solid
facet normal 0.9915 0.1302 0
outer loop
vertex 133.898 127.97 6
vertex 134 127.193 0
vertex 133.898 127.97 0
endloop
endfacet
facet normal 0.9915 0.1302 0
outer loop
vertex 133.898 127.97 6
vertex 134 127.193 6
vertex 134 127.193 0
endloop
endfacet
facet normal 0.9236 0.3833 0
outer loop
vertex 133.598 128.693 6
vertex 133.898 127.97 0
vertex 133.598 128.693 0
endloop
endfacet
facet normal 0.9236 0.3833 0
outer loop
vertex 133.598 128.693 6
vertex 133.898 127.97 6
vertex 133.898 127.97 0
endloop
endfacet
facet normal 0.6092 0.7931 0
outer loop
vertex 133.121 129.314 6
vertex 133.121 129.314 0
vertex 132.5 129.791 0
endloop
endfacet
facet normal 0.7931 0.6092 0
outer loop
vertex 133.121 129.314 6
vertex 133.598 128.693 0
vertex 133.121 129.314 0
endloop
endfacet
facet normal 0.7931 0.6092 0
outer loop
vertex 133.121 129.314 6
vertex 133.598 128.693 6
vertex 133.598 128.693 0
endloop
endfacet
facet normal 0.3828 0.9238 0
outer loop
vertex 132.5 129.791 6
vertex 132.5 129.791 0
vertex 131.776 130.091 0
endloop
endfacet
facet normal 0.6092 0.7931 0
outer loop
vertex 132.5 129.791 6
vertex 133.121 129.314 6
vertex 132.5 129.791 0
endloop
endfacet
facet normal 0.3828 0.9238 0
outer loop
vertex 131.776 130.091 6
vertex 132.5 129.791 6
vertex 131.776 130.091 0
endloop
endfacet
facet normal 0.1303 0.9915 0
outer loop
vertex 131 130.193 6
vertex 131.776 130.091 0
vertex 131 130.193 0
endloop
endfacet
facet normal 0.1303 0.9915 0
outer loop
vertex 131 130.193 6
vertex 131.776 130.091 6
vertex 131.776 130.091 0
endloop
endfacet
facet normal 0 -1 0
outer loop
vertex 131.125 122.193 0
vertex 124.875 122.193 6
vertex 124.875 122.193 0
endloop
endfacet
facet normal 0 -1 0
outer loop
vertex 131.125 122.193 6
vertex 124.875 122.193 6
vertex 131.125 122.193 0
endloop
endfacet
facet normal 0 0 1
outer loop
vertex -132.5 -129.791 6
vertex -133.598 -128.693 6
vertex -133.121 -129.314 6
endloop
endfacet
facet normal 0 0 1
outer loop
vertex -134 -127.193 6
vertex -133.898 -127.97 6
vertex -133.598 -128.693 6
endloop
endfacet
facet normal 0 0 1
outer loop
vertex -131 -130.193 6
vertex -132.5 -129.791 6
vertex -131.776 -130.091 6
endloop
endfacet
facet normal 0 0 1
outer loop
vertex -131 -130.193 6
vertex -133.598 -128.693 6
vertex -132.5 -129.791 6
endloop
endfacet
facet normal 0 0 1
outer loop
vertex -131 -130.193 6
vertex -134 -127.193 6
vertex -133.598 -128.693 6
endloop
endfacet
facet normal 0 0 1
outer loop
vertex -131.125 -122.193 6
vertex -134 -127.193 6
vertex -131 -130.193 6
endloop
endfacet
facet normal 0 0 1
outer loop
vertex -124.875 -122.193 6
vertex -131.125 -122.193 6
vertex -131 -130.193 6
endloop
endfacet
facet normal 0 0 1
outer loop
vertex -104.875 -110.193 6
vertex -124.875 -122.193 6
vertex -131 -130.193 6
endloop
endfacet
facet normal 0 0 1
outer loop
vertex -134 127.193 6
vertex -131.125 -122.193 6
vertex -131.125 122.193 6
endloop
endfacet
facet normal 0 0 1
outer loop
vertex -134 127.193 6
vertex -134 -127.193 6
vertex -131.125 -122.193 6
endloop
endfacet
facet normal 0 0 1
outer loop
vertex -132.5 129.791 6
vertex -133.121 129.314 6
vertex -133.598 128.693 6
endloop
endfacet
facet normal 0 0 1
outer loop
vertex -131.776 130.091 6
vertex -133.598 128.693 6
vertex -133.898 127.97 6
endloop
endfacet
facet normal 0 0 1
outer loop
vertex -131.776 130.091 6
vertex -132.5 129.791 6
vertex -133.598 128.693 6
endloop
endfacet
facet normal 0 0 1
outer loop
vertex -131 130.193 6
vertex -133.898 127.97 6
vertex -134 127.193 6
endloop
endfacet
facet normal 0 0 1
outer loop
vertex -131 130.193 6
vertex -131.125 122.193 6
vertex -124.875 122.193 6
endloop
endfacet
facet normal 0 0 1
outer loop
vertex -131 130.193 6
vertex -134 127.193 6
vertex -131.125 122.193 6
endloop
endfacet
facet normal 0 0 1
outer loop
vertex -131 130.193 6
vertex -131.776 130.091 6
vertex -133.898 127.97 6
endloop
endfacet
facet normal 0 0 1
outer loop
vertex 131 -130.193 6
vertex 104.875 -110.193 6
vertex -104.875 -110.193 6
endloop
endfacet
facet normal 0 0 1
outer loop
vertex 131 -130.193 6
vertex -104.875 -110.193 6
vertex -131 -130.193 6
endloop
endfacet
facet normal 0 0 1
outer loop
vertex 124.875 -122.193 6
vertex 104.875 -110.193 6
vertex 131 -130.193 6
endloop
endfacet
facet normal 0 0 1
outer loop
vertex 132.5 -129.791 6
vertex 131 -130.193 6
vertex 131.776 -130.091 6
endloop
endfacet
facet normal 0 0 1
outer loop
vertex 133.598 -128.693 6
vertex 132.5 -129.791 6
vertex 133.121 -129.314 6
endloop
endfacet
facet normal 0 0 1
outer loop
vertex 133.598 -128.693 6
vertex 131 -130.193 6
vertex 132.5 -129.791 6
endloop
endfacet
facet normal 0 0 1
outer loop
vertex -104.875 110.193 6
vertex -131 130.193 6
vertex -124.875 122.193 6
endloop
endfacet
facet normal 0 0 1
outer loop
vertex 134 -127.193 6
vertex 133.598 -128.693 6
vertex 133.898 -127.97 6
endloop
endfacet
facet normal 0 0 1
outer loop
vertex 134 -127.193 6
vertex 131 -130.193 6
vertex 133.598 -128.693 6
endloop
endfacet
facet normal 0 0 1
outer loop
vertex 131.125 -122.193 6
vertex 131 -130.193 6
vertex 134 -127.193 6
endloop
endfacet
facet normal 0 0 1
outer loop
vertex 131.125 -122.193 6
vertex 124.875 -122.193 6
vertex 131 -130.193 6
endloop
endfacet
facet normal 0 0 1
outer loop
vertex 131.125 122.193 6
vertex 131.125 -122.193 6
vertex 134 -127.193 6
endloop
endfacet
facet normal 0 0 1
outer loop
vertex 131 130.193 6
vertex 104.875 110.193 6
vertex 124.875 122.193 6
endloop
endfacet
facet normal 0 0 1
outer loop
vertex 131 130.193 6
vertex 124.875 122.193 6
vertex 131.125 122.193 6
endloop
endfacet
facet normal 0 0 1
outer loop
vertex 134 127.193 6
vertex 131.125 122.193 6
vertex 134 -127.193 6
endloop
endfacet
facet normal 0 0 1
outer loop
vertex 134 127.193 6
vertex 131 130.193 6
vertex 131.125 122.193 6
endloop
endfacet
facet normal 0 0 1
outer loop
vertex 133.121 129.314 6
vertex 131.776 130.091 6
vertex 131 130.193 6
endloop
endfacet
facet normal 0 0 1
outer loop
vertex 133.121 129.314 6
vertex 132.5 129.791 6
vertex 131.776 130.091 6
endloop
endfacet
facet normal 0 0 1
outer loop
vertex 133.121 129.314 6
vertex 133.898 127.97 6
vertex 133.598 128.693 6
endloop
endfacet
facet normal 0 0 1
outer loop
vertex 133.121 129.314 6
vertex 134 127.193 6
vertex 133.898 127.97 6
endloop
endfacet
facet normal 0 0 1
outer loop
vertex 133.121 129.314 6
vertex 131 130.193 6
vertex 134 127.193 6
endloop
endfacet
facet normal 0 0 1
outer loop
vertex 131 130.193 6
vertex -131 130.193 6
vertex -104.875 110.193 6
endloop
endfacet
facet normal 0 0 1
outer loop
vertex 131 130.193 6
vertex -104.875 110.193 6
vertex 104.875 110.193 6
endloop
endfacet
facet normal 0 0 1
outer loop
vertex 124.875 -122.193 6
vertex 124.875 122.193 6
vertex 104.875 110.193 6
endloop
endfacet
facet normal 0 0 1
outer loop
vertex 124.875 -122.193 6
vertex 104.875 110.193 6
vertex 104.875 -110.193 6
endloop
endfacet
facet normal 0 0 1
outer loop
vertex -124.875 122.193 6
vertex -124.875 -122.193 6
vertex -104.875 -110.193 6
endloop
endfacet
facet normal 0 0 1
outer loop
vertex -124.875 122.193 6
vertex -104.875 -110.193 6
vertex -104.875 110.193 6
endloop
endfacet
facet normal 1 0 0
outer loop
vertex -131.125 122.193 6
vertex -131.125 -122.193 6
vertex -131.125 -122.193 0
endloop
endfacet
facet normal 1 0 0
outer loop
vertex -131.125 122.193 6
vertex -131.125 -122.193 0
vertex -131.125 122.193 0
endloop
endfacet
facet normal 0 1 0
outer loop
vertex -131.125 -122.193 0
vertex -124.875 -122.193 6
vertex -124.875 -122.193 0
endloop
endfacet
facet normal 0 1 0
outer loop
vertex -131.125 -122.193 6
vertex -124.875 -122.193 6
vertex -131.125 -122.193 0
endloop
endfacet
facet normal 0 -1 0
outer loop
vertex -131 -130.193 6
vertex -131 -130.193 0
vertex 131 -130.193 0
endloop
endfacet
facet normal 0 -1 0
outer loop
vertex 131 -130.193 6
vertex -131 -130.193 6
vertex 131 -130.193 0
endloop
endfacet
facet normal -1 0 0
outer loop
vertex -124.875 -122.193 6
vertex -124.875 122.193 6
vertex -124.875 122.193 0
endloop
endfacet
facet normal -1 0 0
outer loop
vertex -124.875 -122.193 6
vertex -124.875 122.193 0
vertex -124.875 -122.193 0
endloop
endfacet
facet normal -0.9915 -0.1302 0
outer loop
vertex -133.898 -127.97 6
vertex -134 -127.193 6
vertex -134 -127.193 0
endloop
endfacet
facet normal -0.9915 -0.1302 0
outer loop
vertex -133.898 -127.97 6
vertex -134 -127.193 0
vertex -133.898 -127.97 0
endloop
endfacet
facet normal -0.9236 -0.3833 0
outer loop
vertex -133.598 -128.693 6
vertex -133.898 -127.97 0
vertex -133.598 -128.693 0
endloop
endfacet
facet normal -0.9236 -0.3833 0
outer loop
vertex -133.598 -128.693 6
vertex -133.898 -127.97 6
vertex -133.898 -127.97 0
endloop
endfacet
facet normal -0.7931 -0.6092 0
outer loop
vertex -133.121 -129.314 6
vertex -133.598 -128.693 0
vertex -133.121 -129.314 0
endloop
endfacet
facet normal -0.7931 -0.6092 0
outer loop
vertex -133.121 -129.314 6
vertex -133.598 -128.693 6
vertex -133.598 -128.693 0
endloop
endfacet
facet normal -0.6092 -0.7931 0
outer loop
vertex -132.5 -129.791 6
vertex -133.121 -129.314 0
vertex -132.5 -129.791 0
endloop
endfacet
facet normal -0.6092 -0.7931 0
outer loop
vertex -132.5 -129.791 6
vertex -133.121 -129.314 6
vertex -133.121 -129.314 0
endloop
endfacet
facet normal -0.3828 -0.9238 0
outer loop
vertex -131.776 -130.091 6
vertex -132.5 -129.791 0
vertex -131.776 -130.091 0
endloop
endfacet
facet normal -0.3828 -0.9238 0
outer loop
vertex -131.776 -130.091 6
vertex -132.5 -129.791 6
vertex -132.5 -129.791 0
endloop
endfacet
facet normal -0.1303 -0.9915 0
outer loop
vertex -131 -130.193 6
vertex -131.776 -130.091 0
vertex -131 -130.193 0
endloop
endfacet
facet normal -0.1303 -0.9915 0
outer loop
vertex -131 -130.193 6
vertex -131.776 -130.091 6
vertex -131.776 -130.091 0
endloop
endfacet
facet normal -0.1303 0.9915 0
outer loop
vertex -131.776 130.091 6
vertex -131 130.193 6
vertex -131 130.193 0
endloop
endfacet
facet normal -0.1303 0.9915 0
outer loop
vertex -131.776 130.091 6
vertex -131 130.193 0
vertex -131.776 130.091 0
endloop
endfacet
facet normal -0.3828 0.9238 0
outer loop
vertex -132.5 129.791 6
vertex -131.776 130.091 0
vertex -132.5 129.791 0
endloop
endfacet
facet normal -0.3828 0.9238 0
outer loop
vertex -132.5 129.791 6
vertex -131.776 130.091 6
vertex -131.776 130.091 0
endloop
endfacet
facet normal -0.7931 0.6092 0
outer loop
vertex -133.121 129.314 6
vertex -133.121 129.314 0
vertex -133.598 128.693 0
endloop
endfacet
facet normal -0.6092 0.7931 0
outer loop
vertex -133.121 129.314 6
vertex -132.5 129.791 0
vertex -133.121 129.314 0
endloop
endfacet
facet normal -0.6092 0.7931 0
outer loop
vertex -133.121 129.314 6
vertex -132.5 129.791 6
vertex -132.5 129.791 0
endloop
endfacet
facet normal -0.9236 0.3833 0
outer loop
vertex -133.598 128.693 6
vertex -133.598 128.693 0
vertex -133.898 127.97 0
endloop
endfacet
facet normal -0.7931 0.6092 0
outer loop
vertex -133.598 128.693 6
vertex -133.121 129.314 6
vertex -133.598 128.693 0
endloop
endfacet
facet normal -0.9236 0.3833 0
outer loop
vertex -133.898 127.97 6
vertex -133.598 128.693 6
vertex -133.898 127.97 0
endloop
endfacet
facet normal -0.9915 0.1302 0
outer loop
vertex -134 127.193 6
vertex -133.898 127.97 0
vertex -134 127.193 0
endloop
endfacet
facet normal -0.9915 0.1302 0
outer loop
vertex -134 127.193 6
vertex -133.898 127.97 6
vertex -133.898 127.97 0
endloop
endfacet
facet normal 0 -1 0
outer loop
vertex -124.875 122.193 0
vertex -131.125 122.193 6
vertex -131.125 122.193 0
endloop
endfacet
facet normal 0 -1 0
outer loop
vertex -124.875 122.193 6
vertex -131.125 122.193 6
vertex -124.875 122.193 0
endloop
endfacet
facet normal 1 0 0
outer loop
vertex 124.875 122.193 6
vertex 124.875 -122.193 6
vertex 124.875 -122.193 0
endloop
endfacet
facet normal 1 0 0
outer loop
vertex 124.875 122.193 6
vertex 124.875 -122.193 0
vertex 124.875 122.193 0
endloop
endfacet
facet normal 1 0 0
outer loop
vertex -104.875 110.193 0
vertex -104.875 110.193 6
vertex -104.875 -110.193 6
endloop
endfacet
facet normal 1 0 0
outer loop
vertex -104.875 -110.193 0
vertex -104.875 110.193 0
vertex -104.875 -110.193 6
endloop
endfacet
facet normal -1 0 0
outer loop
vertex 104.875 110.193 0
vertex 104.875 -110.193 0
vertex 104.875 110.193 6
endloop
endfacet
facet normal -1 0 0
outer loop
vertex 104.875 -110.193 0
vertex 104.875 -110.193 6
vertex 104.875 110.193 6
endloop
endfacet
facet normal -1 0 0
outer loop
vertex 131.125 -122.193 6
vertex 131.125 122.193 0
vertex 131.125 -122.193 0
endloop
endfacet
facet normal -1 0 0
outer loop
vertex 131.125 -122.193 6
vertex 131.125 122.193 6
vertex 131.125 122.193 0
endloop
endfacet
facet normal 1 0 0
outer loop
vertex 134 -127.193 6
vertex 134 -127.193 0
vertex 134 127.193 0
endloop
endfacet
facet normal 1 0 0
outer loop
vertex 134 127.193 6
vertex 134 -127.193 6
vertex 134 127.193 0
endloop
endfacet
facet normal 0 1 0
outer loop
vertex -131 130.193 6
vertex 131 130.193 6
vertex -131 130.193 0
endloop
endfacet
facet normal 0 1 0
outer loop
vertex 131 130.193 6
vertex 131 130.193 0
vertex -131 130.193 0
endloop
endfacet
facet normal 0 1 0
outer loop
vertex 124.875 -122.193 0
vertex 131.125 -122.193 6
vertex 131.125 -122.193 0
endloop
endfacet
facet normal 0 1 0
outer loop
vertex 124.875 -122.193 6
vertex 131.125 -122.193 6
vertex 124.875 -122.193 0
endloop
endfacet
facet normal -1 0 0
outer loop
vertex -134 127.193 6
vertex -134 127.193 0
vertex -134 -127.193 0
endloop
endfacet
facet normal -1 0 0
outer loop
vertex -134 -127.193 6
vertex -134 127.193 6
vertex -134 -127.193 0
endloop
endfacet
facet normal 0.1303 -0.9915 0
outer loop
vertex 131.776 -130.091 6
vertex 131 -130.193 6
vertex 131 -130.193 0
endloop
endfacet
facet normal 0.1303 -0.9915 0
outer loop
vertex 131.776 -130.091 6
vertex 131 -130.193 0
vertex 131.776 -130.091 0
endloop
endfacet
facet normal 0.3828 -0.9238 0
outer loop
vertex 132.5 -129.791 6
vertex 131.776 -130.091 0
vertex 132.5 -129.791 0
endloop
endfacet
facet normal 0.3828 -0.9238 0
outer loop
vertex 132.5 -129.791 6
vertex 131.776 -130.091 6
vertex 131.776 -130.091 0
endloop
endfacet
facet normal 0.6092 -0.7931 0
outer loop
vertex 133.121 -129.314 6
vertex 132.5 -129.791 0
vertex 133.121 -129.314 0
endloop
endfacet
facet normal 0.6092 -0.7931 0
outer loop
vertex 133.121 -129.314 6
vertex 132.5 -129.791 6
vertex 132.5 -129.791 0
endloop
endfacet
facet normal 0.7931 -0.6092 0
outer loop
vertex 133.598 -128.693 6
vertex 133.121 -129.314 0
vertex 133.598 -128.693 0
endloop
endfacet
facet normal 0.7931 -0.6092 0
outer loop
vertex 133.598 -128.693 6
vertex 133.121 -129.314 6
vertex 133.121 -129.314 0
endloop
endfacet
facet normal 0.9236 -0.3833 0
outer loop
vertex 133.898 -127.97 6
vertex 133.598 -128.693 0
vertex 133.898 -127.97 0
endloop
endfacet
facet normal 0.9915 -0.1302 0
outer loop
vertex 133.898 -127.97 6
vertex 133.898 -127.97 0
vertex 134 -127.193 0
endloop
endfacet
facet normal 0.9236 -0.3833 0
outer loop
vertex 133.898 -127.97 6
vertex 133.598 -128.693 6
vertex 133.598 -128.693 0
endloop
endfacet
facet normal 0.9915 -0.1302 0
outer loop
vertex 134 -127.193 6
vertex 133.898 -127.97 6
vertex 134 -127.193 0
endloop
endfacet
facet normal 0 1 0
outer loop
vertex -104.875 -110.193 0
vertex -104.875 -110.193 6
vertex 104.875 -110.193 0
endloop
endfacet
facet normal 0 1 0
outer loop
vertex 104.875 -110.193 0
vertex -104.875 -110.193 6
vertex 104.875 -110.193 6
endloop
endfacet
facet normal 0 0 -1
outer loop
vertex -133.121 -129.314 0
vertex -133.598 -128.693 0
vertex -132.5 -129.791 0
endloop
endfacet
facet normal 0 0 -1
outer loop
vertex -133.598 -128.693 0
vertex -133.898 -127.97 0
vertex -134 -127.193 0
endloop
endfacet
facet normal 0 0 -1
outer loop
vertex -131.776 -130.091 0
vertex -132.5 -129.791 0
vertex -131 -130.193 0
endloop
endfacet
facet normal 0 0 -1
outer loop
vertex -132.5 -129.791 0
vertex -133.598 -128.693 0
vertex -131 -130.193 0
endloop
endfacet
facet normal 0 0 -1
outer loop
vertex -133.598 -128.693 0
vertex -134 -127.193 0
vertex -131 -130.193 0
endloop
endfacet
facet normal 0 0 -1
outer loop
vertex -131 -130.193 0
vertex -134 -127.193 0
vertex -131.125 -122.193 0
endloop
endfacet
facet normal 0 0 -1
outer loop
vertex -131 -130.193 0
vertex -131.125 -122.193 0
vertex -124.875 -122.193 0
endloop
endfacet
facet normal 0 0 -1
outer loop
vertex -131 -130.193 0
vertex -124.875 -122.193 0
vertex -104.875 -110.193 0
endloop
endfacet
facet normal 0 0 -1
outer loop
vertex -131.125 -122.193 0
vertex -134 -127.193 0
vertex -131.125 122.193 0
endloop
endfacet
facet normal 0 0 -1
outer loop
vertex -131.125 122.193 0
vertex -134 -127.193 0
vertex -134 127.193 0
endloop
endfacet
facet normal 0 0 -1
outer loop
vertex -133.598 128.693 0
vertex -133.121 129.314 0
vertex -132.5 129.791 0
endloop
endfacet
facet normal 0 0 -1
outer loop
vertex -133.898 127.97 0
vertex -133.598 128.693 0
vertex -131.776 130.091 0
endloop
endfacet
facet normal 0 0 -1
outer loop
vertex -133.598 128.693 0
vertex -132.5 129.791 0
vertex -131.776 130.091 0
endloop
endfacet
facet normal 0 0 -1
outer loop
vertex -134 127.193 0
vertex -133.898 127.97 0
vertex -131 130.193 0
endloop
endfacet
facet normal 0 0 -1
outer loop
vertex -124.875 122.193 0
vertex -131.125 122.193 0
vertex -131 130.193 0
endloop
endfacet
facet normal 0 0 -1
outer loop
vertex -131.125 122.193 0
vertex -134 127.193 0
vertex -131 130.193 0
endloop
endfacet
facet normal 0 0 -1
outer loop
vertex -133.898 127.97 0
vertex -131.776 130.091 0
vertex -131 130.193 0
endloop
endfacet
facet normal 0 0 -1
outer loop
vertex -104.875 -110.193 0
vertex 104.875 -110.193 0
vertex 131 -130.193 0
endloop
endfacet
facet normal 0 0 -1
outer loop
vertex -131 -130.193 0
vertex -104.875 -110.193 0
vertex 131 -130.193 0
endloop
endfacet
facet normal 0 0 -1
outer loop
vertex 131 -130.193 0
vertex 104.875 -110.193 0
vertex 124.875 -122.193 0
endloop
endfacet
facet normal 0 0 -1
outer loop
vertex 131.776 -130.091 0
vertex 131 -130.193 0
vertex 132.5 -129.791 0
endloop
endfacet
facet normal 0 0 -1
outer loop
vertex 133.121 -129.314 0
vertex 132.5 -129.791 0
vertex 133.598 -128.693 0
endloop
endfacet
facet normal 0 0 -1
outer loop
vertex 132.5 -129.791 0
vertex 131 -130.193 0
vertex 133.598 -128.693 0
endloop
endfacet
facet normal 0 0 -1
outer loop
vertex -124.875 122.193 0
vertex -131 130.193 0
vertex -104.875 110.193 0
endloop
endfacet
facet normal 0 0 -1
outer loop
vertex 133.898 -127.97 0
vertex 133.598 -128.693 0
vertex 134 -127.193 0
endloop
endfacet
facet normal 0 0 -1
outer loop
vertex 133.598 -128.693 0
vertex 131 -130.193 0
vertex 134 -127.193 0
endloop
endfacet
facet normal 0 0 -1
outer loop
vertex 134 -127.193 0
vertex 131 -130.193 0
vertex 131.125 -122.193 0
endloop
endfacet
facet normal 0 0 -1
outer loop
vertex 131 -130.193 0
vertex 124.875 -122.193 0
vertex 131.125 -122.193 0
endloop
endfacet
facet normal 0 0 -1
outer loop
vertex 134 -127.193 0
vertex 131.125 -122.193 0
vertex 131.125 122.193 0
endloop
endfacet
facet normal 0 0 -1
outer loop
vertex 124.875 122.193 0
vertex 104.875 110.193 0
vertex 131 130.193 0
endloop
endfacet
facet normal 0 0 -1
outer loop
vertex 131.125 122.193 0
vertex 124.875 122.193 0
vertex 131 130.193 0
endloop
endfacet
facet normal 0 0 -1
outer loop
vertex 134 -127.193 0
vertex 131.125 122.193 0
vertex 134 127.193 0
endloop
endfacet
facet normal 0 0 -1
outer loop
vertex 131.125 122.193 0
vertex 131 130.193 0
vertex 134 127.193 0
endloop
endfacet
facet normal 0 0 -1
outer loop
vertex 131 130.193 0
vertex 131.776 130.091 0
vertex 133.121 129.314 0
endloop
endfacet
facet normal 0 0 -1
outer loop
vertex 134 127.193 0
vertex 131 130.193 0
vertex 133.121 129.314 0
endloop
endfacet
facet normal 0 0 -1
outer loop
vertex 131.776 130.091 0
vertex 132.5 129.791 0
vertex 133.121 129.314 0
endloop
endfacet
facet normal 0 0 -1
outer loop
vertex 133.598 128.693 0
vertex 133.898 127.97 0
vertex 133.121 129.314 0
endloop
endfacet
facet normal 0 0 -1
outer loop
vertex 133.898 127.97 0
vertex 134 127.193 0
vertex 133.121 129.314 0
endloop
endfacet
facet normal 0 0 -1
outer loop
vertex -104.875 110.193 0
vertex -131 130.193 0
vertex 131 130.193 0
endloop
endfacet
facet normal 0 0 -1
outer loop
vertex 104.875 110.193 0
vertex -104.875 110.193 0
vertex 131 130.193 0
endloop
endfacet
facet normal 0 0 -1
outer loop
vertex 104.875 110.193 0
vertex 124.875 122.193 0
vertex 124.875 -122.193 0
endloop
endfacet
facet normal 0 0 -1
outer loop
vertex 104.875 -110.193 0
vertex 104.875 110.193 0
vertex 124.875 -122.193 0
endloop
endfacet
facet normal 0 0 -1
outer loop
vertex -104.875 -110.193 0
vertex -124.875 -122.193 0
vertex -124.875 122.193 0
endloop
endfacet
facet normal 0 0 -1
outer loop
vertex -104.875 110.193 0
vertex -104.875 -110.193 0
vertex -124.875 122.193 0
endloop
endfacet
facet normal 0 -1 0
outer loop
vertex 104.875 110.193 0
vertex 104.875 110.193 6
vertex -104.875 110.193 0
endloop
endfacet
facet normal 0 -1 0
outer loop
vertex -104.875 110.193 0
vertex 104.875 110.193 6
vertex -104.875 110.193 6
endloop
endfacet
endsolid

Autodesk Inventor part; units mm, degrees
ref_plane "YZ Plane" through (0, 0, 0) normal (1, 0, 0) x (0, 1, 0)
ref_plane "XZ Plane" through (0, 0, 0) normal (0, 1, 0) x (-1, 0, 0)
ref_plane "XY Plane" through (0, 0, 0) normal (0, 0, 1) x (1, 0, 0)
sketch "Sketch1" plane through (0, 0, 0) normal (0, 0, 1) x (1, 0, 0)
  line L0 (-134, -130.1931) -> (134, -130.1931)
  line L1 (134, -130.1931) -> (134, 130.1931)
  line L2 (134, 130.1931) -> (-134, 130.1931)
  line L3 (-134, 130.1931) -> (-134, -130.1931)
  line L4 (-134, -130.1931) -> (134, 130.1931) construction
  line L5 (134, -130.1931) -> (-134, 130.1931) construction
  point P0 (0, 0)
  dimension "d0" = 268
  dimension "d1" = 260.3863
extrude "Extrusion1" add sketch "Sketch1" along normal blind 6
sketch "Sketch2" plane through (0, 0, 6) normal (0, 0, 1) x (1, 0, 0)
  line L0 (-134, -130.1931) -> (134, -130.1931) projected
  line L1 (134, 130.1931) -> (-134, 130.1931) projected
  line L2 (-134, 130.1931) -> (-134, -130.1931) projected
  line L3 (-131.125, 122.1931) -> (-124.875, 122.1931)
  line L4 (-124.875, 122.1931) -> (-124.875, -122.1931)
  line L5 (-124.875, -122.1931) -> (-131.125, -122.1931)
  line L6 (-131.125, -122.1931) -> (-131.125, 122.1931)
  line L7 (-131.125, 122.1931) -> (-124.875, -122.1931) construction
  line L8 (-124.875, 122.1931) -> (-131.125, -122.1931) construction
  point P0 (0, 0)
  point P1 (-128, 0)
  dimension "d5" = 2.875
  dimension "d6" = 6.25
  dimension "d7" = 8
  dimension "d101" = 8
extrude "Extrusion2" cut sketch "Sketch2" against normal through all
mirror "Mirror1" about plane through (0, 0, 0) normal (1, 0, 0) of "Extrusion2"
fillet "Fillet1" radius 3 4 edges at (134, 130.1931, 3) (134, -130.1931, 3) (-134, 130.1931, 3) (-134, -130.1931, 3)
sketch "Sketch3" plane through (0, 0, 6) normal (0, 0, 1) x (1, 0, 0)
  line L0 (131, 130.1931) -> (-131, 130.1931) projected
  line L1 (-124.875, 122.1931) -> (-124.875, -122.1931) projected
  line L2 (-104.875, -110.1931) -> (104.875, -110.1931)
  line L3 (104.875, -110.1931) -> (104.875, 110.1931)
  line L4 (104.875, 110.1931) -> (-104.875, 110.1931)
  line L5 (-104.875, 110.1931) -> (-104.875, -110.1931)
  line L6 (-104.875, -110.1931) -> (104.875, 110.1931) construction
  line L7 (104.875, -110.1931) -> (-104.875, 110.1931) construction
  point P0 (0, 0)
  dimension "d12" = 20
  dimension "d13" = 20
extrude "Extrusion3" cut sketch "Sketch3" against normal through all
properties part number "TopDiagonalPanel"
